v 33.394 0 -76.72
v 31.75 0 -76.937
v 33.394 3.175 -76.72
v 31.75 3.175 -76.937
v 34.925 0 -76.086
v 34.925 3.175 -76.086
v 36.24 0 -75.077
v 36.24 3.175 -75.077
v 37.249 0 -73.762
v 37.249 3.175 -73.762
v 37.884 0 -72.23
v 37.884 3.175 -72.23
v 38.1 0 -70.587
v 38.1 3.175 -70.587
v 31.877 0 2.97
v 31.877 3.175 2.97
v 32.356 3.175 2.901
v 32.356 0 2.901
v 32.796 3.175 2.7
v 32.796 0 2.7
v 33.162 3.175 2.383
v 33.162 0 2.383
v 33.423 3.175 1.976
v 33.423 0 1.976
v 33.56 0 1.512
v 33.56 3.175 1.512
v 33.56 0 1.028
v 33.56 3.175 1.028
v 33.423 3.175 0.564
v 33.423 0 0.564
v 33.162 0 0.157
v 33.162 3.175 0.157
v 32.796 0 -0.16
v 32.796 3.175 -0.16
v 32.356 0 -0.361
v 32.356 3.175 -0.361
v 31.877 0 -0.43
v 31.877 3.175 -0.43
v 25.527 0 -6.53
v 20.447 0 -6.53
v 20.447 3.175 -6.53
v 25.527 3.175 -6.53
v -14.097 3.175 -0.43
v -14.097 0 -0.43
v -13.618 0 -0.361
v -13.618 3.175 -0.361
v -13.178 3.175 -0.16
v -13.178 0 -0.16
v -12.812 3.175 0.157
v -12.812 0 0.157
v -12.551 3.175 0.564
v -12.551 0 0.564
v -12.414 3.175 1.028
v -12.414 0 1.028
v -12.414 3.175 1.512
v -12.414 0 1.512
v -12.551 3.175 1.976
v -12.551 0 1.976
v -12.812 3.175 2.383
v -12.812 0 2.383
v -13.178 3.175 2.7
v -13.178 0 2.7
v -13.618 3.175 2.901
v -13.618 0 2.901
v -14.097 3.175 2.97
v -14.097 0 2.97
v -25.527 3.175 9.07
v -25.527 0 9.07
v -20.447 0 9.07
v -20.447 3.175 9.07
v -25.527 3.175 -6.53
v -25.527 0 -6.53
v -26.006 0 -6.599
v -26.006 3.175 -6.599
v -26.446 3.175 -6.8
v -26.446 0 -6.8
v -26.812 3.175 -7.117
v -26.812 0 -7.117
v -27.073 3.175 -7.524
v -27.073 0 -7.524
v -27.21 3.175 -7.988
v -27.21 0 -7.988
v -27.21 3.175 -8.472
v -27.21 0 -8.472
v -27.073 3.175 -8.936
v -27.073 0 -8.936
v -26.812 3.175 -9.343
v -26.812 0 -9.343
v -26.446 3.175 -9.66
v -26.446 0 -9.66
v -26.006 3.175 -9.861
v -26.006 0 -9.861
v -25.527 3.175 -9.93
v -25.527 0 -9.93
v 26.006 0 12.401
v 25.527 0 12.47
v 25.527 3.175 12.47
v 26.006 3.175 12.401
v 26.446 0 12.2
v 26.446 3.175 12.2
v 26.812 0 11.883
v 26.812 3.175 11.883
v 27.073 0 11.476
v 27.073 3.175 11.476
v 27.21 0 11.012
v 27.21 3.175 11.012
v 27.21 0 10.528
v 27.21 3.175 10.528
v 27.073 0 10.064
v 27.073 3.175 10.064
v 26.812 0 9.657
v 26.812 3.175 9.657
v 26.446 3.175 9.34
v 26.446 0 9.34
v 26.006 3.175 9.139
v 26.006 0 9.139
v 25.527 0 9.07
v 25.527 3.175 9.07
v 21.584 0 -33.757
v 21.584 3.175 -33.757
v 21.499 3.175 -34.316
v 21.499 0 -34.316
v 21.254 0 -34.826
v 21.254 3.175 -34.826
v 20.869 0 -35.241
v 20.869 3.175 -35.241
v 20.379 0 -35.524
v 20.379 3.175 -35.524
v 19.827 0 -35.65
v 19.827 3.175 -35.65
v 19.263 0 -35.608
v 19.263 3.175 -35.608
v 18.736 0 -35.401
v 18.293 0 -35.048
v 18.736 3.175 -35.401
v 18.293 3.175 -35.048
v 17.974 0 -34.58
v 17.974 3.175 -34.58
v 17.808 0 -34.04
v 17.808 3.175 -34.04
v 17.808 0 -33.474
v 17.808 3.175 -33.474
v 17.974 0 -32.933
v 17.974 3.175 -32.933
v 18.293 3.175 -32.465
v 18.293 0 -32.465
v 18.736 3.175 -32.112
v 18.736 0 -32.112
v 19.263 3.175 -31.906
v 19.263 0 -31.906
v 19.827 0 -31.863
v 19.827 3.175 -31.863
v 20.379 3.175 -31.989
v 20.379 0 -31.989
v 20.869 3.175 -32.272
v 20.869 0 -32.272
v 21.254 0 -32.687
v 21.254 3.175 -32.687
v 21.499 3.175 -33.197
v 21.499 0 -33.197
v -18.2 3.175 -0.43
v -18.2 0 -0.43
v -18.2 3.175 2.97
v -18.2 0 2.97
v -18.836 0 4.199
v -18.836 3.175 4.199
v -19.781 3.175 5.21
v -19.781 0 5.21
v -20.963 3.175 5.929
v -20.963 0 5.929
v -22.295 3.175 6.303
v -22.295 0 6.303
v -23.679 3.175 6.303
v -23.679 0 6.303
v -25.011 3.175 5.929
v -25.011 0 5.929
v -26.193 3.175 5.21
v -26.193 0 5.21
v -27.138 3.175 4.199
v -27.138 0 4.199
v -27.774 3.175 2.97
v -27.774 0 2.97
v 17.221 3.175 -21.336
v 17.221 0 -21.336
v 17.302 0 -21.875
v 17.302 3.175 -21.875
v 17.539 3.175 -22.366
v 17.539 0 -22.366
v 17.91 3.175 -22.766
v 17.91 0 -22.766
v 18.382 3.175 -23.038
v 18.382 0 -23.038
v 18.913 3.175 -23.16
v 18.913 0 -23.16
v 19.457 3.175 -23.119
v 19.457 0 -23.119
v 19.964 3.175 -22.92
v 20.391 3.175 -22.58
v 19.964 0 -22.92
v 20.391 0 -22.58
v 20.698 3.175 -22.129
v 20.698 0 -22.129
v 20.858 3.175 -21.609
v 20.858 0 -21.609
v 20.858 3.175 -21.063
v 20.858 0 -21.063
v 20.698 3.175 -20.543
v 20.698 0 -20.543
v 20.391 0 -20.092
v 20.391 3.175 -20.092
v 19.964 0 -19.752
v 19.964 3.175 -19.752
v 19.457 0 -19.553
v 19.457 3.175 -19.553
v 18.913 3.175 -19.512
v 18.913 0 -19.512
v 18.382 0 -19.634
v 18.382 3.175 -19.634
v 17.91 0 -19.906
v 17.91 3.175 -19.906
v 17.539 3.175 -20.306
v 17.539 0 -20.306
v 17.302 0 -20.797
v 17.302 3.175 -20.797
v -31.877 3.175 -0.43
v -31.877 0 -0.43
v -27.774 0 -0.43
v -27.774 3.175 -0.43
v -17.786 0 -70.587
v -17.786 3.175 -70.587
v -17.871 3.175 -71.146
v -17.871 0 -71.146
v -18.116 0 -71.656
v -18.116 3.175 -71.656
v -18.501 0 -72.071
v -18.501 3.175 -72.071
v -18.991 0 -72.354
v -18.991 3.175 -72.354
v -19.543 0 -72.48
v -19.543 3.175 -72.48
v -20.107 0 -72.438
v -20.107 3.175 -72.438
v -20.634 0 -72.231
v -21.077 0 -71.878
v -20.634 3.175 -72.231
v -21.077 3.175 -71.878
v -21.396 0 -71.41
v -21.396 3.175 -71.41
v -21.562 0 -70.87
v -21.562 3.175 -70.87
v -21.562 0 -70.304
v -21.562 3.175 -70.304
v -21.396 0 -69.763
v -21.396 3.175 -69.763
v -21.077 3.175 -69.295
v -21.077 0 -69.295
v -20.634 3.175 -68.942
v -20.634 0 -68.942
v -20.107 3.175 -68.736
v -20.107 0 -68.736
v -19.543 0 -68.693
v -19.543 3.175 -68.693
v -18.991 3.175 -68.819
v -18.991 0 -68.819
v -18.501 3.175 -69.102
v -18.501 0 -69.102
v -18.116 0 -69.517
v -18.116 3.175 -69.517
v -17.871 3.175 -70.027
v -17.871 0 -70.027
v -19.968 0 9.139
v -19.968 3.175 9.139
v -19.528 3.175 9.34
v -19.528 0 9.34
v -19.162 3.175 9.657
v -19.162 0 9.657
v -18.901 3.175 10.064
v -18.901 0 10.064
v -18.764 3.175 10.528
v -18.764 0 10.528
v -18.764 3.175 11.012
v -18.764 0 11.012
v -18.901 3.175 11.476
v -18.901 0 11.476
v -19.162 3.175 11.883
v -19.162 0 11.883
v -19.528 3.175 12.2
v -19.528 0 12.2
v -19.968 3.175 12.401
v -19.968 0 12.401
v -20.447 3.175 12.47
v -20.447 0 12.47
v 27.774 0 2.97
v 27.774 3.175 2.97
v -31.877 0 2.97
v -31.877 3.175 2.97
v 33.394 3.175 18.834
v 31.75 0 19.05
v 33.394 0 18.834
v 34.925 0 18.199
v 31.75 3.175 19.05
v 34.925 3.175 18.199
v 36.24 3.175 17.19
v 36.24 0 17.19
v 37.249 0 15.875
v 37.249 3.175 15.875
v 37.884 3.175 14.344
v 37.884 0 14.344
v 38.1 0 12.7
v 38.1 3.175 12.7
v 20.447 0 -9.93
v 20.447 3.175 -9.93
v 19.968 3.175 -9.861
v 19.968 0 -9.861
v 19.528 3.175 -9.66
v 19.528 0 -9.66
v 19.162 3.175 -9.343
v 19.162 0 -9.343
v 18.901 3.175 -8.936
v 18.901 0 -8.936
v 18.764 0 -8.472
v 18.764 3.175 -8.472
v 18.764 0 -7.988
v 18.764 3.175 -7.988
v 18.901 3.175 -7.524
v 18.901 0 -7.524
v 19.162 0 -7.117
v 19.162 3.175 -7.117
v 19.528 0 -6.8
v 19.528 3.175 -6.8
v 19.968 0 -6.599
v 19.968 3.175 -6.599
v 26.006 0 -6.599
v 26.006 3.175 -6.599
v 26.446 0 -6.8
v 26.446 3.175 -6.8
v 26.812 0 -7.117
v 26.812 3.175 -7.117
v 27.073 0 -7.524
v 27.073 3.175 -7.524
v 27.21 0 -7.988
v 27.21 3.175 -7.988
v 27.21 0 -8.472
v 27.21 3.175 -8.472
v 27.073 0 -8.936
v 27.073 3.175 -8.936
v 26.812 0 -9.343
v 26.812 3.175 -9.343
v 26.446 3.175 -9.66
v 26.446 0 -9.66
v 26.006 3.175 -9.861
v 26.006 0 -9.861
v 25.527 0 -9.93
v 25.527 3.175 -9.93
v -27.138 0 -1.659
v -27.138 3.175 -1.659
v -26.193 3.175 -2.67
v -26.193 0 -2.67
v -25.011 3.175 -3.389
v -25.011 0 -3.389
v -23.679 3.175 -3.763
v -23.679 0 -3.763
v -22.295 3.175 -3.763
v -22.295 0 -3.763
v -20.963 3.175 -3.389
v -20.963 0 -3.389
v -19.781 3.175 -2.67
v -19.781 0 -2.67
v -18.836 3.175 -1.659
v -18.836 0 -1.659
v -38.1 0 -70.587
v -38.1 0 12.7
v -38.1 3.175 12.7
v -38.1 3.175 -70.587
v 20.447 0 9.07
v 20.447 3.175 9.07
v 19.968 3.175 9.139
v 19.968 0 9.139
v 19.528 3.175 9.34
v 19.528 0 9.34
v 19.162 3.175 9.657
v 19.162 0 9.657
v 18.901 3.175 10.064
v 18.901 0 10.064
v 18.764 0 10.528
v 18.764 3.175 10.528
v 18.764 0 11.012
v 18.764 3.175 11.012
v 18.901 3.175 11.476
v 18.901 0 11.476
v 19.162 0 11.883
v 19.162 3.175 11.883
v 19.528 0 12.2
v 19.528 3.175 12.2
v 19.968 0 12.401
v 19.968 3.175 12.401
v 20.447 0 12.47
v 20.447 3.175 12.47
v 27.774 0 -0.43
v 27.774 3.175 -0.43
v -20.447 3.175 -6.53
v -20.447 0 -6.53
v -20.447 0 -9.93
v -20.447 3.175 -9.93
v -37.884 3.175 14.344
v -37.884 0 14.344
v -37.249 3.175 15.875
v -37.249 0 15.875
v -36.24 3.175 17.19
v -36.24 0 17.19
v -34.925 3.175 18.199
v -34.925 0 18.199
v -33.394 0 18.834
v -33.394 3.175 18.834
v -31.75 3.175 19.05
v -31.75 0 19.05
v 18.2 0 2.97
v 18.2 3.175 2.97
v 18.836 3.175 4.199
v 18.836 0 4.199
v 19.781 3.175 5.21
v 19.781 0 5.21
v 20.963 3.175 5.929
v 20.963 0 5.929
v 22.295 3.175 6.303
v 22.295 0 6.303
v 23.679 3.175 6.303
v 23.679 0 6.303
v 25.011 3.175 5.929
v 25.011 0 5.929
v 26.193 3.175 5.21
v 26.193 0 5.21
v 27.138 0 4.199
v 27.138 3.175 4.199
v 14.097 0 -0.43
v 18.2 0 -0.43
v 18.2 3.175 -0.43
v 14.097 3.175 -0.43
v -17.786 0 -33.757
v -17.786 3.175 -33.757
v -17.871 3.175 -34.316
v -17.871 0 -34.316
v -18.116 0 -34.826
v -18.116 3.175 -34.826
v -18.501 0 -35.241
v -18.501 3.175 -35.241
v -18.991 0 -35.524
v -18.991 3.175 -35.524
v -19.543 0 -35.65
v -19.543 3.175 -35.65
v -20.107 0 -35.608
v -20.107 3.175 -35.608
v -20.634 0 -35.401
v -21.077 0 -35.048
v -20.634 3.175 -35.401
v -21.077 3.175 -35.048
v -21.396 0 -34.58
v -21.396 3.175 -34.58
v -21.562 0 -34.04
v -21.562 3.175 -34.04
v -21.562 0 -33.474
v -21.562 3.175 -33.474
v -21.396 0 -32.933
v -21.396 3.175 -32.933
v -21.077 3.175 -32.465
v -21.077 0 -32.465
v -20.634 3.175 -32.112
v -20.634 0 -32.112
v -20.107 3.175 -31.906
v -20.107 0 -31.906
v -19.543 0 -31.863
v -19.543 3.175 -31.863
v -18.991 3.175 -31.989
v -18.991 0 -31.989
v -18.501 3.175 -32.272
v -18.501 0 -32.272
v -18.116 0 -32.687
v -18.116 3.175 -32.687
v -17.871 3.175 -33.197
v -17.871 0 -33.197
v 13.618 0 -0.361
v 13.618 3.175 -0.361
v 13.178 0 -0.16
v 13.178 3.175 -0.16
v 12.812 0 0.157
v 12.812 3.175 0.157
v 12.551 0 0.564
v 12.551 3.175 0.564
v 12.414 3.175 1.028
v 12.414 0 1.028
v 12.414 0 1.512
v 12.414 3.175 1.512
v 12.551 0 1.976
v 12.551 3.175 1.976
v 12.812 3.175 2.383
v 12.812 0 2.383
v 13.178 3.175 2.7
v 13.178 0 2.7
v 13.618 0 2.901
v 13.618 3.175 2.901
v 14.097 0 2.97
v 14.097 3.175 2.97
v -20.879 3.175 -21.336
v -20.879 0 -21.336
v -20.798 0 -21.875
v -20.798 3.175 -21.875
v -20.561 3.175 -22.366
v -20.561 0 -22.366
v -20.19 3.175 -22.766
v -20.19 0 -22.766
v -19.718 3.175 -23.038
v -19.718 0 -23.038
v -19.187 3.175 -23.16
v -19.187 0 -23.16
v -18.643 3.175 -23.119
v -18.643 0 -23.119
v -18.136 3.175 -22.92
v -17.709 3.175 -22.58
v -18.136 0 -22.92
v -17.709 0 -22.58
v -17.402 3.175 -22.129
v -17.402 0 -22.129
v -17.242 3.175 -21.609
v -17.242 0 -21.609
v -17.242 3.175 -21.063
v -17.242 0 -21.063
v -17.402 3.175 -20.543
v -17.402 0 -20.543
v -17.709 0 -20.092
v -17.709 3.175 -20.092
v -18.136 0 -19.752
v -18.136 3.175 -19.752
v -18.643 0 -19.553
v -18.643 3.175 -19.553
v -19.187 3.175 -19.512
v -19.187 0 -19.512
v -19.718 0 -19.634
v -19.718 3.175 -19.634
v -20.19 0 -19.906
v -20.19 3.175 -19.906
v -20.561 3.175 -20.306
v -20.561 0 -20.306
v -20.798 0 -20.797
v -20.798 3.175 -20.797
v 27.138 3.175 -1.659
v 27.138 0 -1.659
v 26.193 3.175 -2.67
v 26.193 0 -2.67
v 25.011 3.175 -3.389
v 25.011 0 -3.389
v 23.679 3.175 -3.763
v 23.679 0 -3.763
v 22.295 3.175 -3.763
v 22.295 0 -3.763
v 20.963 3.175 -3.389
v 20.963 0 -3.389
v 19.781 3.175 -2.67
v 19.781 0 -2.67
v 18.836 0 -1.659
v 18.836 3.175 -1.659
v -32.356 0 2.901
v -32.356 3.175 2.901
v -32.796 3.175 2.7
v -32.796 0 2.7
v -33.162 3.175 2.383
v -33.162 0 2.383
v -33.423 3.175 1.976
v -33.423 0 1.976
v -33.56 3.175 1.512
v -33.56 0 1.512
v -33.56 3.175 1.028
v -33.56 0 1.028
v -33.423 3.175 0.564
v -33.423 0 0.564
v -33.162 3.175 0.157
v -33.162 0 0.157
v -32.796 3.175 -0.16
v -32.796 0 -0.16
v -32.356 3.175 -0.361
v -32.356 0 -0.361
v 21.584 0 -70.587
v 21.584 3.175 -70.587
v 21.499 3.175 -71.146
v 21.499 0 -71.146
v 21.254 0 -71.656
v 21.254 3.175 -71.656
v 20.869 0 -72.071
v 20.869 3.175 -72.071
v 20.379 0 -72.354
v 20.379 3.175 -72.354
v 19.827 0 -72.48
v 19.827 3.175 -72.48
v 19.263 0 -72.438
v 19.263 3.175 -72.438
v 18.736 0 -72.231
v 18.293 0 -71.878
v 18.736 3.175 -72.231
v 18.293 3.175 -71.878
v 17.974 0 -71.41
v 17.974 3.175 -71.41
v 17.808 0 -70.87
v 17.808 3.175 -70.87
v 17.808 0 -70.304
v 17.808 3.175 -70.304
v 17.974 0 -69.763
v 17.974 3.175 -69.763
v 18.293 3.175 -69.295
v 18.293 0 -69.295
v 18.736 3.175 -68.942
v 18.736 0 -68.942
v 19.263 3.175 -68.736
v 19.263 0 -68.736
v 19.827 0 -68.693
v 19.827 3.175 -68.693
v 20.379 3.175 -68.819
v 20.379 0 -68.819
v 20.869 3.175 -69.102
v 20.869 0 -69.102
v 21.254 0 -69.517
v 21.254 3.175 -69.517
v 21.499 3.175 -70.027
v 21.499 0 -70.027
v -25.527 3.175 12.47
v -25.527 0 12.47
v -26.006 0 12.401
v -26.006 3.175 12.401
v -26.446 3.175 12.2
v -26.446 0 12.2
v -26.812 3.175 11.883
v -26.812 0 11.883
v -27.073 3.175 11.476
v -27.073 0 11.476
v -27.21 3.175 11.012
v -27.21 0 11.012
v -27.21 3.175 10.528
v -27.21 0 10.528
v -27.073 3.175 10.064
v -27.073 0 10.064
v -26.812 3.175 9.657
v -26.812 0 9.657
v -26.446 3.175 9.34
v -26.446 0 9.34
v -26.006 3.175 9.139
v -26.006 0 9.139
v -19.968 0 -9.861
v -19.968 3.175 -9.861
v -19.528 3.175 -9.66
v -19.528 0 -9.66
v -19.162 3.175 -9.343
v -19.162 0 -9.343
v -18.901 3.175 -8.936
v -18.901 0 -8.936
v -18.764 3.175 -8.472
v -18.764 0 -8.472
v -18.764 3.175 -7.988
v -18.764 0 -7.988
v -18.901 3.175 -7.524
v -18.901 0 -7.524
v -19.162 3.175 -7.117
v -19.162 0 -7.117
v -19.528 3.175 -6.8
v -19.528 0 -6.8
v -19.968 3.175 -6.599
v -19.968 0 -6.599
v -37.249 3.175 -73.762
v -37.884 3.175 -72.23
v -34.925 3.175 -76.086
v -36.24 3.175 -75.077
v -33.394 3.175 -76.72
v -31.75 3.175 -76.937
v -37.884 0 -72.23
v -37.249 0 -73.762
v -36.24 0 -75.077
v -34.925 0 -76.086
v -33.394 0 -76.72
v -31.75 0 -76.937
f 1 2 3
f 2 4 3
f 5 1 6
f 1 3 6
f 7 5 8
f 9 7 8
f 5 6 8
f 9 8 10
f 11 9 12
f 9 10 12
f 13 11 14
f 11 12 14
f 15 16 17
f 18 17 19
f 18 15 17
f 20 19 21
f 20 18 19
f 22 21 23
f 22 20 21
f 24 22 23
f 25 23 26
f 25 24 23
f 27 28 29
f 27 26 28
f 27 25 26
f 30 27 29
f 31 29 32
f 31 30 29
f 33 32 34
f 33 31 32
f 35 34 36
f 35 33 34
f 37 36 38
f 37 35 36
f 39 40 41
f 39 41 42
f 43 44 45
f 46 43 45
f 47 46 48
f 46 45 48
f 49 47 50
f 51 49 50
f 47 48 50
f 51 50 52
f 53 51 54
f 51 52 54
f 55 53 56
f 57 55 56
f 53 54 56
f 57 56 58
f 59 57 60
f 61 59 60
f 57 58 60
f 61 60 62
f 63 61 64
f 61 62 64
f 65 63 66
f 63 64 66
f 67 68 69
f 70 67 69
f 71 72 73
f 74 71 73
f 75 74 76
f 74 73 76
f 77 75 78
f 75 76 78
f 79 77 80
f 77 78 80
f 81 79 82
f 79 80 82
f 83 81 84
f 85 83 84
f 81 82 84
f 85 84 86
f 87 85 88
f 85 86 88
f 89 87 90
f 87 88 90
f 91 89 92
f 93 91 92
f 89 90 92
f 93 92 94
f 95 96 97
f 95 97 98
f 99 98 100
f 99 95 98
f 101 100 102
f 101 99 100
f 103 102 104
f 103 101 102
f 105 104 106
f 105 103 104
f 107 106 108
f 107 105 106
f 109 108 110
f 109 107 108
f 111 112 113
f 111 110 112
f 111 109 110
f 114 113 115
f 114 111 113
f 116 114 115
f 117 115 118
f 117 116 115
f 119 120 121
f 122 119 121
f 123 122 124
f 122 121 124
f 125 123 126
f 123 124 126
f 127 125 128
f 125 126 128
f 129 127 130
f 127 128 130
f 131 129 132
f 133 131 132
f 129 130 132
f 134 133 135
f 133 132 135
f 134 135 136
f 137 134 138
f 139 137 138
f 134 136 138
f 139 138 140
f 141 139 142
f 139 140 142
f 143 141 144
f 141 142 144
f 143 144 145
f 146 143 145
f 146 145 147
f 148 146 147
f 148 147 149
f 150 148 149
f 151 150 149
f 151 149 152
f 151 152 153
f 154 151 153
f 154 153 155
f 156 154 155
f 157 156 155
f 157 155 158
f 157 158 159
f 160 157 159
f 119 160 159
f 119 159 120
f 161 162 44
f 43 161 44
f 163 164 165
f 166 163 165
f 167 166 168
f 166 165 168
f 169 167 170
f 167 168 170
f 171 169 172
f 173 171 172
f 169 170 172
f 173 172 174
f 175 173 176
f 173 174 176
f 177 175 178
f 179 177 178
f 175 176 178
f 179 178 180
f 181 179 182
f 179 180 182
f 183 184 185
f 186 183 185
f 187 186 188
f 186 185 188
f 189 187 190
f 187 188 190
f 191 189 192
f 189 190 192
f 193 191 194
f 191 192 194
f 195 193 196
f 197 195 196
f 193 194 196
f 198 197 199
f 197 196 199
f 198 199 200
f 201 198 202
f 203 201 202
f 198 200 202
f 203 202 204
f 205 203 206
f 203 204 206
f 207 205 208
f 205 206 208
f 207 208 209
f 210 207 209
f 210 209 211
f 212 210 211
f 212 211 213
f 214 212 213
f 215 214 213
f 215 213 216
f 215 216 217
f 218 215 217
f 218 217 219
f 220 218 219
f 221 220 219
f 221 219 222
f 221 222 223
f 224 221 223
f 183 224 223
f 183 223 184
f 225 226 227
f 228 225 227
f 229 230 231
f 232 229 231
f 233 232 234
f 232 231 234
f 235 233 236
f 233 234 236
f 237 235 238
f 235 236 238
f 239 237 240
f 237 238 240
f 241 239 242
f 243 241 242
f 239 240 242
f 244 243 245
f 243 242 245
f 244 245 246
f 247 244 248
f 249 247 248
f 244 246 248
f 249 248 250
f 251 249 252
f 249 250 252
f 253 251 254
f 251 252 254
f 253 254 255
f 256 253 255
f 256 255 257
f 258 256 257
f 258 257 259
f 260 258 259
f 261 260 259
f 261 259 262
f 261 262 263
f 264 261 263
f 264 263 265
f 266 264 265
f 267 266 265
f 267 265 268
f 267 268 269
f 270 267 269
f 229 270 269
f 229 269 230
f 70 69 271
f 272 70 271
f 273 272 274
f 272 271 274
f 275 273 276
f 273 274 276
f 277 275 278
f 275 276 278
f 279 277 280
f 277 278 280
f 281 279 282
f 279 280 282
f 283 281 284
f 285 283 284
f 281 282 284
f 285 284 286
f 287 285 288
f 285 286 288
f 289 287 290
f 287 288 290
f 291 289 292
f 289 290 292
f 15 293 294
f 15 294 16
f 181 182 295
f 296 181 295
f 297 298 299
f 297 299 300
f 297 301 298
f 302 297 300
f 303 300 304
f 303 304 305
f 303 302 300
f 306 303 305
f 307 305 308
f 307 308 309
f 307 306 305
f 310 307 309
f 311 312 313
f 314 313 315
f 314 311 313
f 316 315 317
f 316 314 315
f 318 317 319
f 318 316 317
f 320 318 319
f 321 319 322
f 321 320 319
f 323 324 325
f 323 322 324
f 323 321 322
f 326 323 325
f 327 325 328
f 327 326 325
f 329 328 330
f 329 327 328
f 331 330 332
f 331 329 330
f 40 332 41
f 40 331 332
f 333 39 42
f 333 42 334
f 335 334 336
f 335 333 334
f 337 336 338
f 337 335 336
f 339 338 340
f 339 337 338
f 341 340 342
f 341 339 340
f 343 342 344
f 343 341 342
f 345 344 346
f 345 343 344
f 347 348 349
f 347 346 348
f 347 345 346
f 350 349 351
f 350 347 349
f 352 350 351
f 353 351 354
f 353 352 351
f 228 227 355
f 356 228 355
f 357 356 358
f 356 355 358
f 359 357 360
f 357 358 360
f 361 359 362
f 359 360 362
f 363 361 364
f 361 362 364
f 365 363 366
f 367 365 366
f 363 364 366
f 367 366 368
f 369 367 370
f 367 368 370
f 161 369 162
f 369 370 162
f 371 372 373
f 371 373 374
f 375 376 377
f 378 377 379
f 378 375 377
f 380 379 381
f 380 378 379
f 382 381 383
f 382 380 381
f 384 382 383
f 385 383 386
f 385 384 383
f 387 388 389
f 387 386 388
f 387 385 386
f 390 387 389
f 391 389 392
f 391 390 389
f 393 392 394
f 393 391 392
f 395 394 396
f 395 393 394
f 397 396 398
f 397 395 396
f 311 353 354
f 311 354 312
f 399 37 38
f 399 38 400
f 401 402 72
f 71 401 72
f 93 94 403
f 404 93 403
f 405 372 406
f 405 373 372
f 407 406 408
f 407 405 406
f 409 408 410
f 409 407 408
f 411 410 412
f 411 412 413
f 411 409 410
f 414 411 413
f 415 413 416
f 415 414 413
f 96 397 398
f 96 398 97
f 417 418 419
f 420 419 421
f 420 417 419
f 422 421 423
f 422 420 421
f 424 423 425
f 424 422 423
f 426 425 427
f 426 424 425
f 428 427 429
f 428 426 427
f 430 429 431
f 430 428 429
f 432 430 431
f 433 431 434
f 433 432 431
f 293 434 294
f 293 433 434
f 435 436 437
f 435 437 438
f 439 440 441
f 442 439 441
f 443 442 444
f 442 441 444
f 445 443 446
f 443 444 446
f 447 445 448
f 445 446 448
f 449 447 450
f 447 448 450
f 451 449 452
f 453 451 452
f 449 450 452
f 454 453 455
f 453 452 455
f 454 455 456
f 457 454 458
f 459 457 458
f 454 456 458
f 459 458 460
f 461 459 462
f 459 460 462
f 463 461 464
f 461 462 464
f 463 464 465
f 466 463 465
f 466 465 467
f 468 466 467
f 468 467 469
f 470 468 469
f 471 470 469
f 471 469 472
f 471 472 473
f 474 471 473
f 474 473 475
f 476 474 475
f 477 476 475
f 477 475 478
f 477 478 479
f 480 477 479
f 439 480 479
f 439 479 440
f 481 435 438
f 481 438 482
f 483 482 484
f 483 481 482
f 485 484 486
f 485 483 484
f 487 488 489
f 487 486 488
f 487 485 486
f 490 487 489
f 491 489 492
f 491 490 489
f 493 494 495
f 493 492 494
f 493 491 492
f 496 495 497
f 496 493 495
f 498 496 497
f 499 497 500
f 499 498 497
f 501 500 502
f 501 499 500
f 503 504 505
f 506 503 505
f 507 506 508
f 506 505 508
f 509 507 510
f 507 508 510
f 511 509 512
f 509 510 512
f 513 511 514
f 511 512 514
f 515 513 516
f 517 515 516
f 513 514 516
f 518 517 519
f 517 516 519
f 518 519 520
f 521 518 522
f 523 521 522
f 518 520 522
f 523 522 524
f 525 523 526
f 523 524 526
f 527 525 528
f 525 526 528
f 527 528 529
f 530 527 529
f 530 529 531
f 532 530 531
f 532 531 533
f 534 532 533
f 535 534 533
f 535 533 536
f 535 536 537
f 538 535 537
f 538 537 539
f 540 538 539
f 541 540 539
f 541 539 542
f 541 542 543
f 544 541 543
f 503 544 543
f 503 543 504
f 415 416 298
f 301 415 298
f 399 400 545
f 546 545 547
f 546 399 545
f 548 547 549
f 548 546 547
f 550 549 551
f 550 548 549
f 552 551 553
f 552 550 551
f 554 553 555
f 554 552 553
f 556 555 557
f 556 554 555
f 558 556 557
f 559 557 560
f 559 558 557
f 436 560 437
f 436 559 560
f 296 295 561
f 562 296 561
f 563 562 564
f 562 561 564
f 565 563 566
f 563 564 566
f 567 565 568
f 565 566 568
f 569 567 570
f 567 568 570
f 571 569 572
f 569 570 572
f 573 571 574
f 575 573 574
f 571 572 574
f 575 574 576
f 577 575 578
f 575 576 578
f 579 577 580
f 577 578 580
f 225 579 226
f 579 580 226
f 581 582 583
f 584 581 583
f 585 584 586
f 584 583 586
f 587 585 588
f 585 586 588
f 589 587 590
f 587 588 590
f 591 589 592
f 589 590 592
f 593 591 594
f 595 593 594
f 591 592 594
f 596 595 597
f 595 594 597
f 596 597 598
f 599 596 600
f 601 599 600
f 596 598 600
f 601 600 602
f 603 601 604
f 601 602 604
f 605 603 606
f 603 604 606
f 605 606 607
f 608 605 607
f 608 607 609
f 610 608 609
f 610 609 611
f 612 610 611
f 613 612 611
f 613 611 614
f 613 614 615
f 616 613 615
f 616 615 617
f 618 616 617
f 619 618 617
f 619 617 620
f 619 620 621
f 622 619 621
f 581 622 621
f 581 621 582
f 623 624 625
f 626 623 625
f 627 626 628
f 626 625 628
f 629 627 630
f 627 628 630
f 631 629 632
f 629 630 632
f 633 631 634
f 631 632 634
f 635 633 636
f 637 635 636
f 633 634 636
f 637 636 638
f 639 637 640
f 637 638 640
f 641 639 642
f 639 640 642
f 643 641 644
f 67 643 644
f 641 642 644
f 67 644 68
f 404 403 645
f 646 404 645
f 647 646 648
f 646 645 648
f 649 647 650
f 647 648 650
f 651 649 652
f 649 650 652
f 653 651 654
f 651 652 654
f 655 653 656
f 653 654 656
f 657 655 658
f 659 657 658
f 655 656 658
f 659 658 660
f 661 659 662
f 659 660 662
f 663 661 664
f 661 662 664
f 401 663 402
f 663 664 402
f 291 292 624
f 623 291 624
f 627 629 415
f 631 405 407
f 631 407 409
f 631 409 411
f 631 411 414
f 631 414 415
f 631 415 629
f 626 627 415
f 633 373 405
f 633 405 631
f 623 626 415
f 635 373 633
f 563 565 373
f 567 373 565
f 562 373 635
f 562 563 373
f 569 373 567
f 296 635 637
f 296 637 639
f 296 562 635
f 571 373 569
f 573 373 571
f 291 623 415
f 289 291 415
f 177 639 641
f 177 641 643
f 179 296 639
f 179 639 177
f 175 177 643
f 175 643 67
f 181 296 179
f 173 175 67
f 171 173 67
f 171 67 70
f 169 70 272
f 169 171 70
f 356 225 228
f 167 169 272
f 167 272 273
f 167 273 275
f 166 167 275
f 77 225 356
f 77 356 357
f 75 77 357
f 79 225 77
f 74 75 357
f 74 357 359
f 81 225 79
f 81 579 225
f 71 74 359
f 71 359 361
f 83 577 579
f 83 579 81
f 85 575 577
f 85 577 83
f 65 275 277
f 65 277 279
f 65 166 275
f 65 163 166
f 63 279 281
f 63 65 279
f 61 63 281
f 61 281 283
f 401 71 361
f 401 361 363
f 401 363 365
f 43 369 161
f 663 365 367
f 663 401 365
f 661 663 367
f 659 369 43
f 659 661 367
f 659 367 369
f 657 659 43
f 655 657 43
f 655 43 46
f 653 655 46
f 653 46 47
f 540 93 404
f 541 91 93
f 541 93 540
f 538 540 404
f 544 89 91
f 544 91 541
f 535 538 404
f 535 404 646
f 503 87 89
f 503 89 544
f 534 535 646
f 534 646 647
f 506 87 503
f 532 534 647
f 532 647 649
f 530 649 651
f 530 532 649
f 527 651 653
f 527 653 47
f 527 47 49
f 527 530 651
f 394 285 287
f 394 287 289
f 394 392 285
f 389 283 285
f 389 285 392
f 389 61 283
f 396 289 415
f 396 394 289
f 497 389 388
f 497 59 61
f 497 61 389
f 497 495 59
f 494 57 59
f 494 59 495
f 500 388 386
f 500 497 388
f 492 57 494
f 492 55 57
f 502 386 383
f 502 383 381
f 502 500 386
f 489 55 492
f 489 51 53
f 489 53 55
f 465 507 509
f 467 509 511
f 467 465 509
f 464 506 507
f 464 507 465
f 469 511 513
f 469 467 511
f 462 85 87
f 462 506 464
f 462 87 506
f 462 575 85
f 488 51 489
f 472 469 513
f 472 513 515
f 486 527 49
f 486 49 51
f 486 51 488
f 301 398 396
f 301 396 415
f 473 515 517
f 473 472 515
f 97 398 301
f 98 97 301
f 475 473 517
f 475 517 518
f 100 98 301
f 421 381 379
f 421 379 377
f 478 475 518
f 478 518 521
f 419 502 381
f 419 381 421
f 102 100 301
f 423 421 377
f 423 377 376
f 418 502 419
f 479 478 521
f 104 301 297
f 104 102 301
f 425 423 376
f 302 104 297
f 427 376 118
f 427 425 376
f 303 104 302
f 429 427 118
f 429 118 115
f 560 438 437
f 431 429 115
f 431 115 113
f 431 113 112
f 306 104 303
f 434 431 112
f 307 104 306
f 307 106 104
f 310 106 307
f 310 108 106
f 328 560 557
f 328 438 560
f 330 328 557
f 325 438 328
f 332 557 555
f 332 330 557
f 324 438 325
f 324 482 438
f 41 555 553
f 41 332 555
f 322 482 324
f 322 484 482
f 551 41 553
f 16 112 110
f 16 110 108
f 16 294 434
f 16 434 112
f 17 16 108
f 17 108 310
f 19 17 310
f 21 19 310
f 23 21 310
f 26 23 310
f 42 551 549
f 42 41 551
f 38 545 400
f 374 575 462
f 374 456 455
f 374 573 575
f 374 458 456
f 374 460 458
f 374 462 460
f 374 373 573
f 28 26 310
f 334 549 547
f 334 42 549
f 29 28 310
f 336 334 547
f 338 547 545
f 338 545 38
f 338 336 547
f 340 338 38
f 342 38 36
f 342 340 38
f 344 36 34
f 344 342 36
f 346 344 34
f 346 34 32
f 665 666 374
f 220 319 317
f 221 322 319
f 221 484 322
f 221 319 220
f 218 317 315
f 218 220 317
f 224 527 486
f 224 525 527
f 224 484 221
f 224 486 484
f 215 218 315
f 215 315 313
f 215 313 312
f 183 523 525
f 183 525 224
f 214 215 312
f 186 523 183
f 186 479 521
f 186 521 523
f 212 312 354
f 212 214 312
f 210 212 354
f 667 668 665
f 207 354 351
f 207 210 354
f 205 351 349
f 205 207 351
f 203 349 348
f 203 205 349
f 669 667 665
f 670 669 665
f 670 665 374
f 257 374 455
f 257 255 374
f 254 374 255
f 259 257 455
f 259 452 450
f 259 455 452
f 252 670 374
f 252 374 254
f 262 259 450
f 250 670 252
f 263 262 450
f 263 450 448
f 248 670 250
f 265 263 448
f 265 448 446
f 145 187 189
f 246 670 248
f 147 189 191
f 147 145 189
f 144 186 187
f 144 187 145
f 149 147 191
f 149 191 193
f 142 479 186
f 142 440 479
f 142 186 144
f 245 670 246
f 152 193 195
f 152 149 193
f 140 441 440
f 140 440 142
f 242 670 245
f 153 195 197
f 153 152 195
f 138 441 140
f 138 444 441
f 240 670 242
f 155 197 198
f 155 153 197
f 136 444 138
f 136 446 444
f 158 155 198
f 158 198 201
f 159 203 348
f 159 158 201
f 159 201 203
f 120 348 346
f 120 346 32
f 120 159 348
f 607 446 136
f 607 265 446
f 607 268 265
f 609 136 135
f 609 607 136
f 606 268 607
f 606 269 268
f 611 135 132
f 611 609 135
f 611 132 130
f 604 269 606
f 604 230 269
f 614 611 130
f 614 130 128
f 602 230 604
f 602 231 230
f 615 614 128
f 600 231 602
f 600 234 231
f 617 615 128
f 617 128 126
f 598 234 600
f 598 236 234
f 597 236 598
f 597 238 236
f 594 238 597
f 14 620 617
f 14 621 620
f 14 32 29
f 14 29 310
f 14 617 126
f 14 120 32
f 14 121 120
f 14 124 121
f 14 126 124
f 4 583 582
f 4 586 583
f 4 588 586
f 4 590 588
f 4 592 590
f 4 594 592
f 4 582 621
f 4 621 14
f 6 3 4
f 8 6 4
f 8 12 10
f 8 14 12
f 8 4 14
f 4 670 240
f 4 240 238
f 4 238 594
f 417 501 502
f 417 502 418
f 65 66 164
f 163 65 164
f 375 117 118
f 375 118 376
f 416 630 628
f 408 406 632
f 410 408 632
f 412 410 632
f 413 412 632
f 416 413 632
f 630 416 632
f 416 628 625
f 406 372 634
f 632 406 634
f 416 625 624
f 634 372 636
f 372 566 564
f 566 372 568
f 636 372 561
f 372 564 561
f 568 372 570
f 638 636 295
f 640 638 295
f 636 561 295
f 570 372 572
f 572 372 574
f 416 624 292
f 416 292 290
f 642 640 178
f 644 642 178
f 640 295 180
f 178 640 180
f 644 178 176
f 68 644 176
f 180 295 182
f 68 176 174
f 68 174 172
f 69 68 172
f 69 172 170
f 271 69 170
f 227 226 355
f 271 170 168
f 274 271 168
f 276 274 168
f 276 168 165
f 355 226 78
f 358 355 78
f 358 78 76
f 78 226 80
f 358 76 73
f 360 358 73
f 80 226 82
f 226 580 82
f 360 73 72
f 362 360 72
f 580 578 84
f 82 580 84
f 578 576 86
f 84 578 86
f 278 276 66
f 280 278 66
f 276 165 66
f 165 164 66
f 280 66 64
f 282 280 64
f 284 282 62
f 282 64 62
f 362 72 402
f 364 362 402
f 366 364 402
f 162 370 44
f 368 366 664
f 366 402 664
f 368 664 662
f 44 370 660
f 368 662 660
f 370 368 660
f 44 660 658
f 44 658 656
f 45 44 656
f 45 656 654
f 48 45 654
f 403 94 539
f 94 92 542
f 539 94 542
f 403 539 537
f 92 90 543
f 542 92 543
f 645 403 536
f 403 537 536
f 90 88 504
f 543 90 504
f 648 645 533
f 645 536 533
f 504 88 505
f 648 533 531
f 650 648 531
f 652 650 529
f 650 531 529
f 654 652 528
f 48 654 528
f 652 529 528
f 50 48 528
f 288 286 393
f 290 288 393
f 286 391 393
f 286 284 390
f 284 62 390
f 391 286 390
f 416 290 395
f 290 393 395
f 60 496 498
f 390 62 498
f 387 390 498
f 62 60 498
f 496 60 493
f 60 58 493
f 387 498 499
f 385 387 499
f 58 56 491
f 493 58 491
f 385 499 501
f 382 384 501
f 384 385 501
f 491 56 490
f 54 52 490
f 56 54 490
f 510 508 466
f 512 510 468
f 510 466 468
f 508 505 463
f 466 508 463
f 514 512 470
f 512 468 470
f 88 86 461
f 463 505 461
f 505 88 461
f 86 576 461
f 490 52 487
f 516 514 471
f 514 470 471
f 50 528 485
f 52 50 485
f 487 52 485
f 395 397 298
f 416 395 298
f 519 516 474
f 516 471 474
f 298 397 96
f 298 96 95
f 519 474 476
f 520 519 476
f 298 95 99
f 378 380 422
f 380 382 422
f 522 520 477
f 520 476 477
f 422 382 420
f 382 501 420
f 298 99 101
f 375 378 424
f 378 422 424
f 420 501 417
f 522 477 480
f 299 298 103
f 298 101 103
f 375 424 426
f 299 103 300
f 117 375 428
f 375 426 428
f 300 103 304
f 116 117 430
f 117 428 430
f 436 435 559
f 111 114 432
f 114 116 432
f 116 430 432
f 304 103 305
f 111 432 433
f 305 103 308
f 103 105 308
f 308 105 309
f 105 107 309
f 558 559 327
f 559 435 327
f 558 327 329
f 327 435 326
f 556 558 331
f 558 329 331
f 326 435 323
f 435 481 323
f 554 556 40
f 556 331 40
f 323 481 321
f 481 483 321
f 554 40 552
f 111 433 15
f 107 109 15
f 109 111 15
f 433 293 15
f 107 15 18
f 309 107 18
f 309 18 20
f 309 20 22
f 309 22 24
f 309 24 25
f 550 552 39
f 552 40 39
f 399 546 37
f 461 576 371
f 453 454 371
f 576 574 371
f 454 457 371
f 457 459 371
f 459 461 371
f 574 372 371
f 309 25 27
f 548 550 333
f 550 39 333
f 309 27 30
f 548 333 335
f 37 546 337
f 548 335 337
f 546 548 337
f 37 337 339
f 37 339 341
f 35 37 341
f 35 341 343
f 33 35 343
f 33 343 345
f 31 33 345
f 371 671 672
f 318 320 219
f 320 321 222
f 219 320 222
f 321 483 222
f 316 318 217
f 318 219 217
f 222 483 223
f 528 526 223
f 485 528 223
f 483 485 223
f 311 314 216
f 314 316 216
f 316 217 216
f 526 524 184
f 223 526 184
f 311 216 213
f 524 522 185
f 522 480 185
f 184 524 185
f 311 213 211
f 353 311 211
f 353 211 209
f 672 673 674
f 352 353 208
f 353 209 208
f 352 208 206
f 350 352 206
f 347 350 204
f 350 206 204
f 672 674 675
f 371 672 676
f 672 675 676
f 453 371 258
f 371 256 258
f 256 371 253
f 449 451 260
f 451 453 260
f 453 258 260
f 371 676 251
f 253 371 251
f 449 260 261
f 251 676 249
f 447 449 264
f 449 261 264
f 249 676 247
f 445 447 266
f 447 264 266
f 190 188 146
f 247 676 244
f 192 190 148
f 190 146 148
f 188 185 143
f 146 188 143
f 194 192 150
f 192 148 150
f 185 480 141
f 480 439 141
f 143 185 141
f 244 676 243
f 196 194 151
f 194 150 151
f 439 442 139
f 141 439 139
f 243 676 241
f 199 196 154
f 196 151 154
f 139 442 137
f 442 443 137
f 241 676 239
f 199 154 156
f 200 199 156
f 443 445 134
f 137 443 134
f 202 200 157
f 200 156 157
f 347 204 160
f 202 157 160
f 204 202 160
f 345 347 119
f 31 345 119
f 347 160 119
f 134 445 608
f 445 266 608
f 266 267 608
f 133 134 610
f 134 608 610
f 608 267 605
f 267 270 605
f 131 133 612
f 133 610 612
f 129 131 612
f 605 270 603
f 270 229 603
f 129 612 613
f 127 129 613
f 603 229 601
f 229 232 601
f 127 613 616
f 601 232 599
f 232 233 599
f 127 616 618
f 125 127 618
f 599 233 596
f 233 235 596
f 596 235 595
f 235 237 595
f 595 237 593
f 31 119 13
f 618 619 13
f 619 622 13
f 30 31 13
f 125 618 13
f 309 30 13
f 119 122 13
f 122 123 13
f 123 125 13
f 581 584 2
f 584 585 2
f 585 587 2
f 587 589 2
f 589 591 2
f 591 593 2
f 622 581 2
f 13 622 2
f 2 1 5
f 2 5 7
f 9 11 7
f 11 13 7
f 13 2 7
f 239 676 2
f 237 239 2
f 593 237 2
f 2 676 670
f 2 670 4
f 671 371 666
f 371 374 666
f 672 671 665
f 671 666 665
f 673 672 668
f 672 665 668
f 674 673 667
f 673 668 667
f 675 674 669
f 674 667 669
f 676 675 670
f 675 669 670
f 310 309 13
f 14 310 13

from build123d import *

# Parameters (mm, degrees)
SKETCH1_W             = 76.2
SKETCH1_H             = 38.1
BOSS_EXTRUDE1_DEPTH   = 3.175
CUT_EXTRUDE1_DEPTH    = 43.715256349
SKETCH5_W             = 76.2
SKETCH5_H             = 57.8866
BOSS_EXTRUDE3_DEPTH   = 3.175
F_6_CLEARANCE_HOLE1_D = 3.6576
FILLET1_R             = 6.35
F_6_CLEARANCE_HOLE2_D = 3.7973


with BuildPart() as part:
    # Sketch1 → Boss-Extrude1 (new body)
    with BuildSketch(Plane(origin=(0, 0, 0), x_dir=(1, 0, 0), z_dir=(0, 1, 0))):
        Rectangle(SKETCH1_W, SKETCH1_H)
    extrude(amount=BOSS_EXTRUDE1_DEPTH)

    # Sketch3 → Cut-Extrude1 (cut, through all)
    with BuildSketch(Plane.XZ):
        with BuildLine():
            Line((-20.447, 12.47), (-25.527, 12.47))
            ThreePointArc((-25.527, 12.47), (-27.227, 10.77), (-25.527, 9.07))
            Line((-25.527, 9.07), (-20.447, 9.07))
            ThreePointArc((-20.447, 9.07), (-18.747, 10.77), (-20.447, 12.47))
        make_face()
        with BuildLine():
            Line((-27.774107686, 2.97), (-31.877, 2.97))
            ThreePointArc((-31.877, 2.97), (-33.577, 1.27), (-31.877, -0.43))
            Line((-31.877, -0.43), (-27.774107686, -0.43))
            ThreePointArc((-27.774107686, -0.43), (-28.067, 1.27), (-27.774107686, 2.97))
        make_face()
        with BuildLine():
            Line((-18.199892314, 2.97), (-27.774107686, 2.97))
            ThreePointArc((-27.774107686, 2.97), (-28.067, 1.27), (-27.774107686, -0.43))
            Line((-27.774107686, -0.43), (-18.199892314, -0.43))
            ThreePointArc((-18.199892314, -0.43), (-17.980758543, 0.40747668), (-17.907, 1.27))
            ThreePointArc((-17.907, 1.27), (-17.980758543, 2.13252332), (-18.199892314, 2.97))
        make_face()
        with BuildLine():
            ThreePointArc((-18.199892314, 2.97), (-22.987, 6.35), (-27.774107686, 2.97))
            Line((-27.774107686, 2.97), (-18.199892314, 2.97))
        make_face()
        with BuildLine():
            Line((-14.097, 2.97), (-18.199892314, 2.97))
            ThreePointArc((-18.199892314, 2.97), (-17.980758543, 2.13252332), (-17.907, 1.27))
            ThreePointArc((-17.907, 1.27), (-17.980758543, 0.40747668), (-18.199892314, -0.43))
            Line((-18.199892314, -0.43), (-14.097, -0.43))
            ThreePointArc((-14.097, -0.43), (-12.397, 1.27), (-14.097, 2.97))
        make_face()
        with BuildLine():
            Line((-18.199892314, -0.43), (-27.774107686, -0.43))
            ThreePointArc((-27.774107686, -0.43), (-22.987, -3.81), (-18.199892314, -0.43))
        make_face()
        with BuildLine():
            Line((-25.527, -9.93), (-20.447, -9.93))
            ThreePointArc((-20.447, -9.93), (-18.747, -8.23), (-20.447, -6.53))
            Line((-20.447, -6.53), (-25.527, -6.53))
            ThreePointArc((-25.527, -6.53), (-27.227, -8.23), (-25.527, -9.93))
        make_face()
    cut_extrude1 = extrude(amount=-CUT_EXTRUDE1_DEPTH, mode=Mode.SUBTRACT)

    # Mirror1: Cut-Extrude1 across plane
    add(cut_extrude1.mirror(Plane(origin=(0, 0, 0), x_dir=(0, 0, 1), z_dir=(1, 0, 0))), mode=Mode.SUBTRACT)

    # Sketch5 → Boss-Extrude3 (add)
    with BuildSketch(Plane(origin=(0, 0, 0), x_dir=(1, 0, 0), z_dir=(0, 1, 0))):
        with Locations((0, 47.9933)):
            Rectangle(SKETCH5_W, SKETCH5_H)
    extrude(amount=BOSS_EXTRUDE3_DEPTH)

    # #6 Clearance Hole1 (through all)
    with Locations(Plane(origin=(0, 3.175, 0), x_dir=(1, 0, 0), z_dir=(0, 1, 0))):
        with Locations((-19.05, 21.336), (19.05, 21.336)):
            Hole(F_6_CLEARANCE_HOLE1_D / 2)

    # Fillet1
    fillet1_edges = [part.edges().sort_by_distance(p)[0] for p in [
        (-38.1, 1.5875, -76.9366),
        (38.1, 1.5875, -76.9366),
        (38.1, 1.5875, 19.05),
        (-38.1, 1.5875, 19.05),
    ]]
    fillet(fillet1_edges, radius=FILLET1_R)

    # #6 Clearance Hole2 (through all)
    with Locations(Plane(origin=(0, 0, 0), x_dir=(-1, 0, 0), z_dir=(0, -1, 0))):
        with Locations((19.685, 70.5866), (19.685, 33.7566), (-19.685, 70.5866), (-19.685, 33.7566)):
            Hole(F_6_CLEARANCE_HOLE2_D / 2)


solid = part.part
